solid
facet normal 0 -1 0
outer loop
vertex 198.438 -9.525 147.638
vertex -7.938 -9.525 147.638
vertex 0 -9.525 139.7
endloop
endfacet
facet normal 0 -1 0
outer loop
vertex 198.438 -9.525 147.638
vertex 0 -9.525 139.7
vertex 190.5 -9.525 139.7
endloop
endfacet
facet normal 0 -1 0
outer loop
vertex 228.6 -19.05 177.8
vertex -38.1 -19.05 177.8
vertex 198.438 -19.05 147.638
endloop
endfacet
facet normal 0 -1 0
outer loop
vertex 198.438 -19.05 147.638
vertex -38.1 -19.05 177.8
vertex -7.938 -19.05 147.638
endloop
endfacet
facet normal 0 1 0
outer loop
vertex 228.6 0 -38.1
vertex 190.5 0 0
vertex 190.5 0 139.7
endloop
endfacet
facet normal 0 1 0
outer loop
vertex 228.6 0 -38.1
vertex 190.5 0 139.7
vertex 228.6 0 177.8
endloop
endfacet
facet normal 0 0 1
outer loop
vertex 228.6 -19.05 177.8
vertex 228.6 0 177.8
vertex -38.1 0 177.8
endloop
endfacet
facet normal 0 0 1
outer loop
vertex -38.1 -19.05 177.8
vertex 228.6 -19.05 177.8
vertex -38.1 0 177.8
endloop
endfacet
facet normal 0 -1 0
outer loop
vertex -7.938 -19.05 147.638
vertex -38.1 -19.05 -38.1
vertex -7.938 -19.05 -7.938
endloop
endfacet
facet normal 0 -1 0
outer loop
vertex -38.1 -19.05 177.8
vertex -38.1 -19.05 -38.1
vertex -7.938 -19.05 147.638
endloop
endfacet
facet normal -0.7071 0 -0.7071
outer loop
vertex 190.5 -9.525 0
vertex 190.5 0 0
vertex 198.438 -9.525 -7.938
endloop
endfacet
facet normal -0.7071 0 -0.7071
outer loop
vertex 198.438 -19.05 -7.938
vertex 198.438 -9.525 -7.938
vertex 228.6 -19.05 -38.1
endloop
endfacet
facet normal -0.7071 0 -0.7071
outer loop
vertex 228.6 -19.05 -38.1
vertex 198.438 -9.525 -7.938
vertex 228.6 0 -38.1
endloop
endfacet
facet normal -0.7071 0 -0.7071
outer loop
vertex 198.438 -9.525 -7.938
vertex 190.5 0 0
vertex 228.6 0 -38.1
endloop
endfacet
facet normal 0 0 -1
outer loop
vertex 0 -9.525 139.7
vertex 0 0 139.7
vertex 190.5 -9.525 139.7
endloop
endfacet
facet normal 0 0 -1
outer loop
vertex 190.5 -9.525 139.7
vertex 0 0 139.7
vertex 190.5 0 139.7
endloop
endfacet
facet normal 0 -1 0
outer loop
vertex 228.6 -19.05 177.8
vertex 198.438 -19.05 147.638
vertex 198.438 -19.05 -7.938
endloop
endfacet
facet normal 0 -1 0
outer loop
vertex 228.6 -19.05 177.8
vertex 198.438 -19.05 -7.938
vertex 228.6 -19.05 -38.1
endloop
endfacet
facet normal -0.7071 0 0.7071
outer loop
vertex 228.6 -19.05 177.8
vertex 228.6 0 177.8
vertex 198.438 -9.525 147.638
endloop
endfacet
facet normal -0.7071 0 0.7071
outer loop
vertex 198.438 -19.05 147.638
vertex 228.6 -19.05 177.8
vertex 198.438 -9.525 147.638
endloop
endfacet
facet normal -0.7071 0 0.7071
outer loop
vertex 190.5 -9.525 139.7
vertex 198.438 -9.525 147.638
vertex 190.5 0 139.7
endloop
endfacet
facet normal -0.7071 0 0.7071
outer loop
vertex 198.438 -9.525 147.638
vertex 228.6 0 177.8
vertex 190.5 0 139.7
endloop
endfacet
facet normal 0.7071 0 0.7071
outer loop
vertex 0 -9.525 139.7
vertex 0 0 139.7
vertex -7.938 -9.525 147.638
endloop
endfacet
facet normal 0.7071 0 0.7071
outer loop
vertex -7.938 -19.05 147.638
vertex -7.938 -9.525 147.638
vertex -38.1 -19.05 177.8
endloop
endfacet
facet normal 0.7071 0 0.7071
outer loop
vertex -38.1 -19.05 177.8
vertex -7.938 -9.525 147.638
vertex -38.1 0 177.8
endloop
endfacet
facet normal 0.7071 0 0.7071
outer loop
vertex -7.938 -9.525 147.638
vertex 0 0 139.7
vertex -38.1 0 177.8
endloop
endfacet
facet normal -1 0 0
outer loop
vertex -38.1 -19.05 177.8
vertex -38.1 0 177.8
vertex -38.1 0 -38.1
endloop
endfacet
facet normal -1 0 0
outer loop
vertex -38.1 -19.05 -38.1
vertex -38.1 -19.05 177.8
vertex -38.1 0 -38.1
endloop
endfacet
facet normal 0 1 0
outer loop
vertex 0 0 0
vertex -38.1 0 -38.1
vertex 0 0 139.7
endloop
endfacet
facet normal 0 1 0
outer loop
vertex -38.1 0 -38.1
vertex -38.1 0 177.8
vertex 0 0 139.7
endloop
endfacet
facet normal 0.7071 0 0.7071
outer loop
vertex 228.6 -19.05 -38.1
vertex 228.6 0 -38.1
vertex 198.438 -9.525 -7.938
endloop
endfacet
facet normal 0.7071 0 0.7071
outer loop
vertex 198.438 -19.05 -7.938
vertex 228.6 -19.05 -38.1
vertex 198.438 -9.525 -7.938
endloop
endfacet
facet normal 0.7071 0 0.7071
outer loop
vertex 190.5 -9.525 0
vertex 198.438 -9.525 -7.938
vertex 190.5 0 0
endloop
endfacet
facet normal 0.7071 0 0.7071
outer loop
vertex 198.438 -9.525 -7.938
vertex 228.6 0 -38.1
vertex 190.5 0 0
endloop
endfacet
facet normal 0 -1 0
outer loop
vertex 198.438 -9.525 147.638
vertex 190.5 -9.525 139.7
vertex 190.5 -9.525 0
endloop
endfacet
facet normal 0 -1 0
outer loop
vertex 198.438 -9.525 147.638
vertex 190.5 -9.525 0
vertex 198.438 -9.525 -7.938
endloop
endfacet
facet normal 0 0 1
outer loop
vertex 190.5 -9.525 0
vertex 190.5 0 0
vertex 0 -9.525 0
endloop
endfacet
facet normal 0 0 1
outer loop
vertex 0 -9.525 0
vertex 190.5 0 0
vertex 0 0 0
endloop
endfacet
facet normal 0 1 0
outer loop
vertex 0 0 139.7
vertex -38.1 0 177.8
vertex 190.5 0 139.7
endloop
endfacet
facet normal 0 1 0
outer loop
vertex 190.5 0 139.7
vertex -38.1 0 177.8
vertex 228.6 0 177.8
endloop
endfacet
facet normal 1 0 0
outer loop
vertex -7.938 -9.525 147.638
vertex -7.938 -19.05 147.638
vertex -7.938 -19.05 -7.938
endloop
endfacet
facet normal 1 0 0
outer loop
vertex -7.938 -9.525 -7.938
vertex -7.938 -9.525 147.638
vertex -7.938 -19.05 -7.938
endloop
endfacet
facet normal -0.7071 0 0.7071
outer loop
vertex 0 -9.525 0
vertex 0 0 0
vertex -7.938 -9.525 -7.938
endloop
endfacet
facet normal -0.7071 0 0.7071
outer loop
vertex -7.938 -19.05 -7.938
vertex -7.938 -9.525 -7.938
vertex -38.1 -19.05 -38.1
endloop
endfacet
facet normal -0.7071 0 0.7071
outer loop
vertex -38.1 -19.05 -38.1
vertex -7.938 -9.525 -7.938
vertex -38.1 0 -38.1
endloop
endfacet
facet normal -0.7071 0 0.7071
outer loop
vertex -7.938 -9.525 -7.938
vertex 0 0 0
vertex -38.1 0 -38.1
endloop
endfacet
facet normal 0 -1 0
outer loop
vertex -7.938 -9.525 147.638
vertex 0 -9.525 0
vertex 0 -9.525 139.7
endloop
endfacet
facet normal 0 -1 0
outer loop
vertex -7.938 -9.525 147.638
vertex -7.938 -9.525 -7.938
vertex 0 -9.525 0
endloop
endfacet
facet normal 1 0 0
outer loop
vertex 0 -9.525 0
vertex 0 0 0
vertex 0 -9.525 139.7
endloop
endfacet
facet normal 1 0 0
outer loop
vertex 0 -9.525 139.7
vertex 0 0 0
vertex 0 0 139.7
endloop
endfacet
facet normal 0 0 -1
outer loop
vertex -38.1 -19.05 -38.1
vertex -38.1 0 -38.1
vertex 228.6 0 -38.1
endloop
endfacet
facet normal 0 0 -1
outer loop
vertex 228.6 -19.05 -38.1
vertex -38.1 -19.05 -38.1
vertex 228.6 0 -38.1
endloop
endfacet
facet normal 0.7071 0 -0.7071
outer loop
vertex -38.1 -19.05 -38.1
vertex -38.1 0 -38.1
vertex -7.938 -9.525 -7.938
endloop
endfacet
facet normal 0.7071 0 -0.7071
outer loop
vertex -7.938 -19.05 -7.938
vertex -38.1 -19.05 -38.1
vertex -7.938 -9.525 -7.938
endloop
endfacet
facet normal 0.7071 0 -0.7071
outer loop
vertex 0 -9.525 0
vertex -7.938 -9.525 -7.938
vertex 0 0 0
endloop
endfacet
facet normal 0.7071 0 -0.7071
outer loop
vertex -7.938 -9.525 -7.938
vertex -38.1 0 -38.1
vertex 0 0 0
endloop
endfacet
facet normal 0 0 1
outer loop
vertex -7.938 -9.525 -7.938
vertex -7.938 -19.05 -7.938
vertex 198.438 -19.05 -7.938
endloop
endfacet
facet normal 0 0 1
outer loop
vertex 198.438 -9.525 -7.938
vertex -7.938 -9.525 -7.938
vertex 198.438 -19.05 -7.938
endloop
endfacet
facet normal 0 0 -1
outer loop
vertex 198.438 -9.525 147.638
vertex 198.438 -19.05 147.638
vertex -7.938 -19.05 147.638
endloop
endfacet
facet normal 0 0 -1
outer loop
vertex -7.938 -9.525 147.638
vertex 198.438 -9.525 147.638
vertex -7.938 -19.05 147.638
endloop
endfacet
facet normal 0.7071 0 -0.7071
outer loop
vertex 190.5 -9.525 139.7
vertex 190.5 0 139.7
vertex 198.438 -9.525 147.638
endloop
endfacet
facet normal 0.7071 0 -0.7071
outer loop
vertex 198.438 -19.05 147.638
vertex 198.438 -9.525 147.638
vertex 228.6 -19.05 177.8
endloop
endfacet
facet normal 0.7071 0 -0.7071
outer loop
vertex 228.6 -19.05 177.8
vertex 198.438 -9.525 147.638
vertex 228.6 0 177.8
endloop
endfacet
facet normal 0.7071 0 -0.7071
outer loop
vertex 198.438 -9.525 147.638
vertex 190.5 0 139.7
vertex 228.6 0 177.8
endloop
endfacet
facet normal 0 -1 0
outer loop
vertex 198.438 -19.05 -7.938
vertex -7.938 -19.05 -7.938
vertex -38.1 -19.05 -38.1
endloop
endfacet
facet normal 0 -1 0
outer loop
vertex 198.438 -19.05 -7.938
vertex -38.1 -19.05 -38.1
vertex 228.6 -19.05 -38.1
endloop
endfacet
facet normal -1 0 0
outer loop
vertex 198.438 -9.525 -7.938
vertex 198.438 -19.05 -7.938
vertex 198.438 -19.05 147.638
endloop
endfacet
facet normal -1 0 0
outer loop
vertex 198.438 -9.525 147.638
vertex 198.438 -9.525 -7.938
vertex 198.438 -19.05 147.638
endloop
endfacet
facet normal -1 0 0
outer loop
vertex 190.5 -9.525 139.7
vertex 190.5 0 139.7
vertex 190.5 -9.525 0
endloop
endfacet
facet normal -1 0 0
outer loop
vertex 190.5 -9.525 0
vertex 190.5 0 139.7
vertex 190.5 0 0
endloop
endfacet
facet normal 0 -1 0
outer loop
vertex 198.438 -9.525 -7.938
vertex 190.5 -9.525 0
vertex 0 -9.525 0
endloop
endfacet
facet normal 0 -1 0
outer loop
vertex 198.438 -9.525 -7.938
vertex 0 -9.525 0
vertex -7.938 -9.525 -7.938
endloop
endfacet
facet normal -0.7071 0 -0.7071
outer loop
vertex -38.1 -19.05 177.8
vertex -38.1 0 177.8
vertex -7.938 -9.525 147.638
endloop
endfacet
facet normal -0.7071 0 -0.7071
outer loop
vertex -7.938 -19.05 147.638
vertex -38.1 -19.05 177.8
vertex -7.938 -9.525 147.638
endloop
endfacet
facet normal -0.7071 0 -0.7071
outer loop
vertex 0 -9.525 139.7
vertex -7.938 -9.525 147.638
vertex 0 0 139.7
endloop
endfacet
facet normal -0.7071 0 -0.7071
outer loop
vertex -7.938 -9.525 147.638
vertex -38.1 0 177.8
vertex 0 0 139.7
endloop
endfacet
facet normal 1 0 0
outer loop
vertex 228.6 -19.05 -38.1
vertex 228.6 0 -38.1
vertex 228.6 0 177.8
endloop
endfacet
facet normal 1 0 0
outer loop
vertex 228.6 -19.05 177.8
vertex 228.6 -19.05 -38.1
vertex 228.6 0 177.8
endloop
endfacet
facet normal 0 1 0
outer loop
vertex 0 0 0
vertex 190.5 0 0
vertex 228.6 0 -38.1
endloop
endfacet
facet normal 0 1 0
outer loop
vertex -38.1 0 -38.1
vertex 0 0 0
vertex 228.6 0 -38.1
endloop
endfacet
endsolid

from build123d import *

# Parameters (mm, degrees)
F1_DEPTH = 19.05
F2_DEPTH = 19.05
F3_DEPTH = 19.05
F4_DEPTH = 19.05
F6_DEPTH = 9.525


with BuildPart() as f1:
    # F0 (on Front) → F1 (new body)
    with BuildSketch(Plane.XZ):
        Polygon((-38.1, -38.1), (0, 0), (0, 139.7), (-38.1, 177.8), align=None)
    extrude(amount=F1_DEPTH)


with BuildPart() as f2:
    # F0 (on Front) → F2 (new body)
    with BuildSketch(Plane.XZ):
        Polygon((-38.1, 177.8), (0, 139.7), (190.5, 139.7), (228.6, 177.8), align=None)
    extrude(amount=F2_DEPTH)


with BuildPart() as f3:
    # F0 (on Front) → F3 (new body)
    with BuildSketch(Plane.XZ):
        Polygon((190.5, 139.7), (190.5, 0), (228.6, -38.1), (228.6, 177.8), align=None)
    extrude(amount=F3_DEPTH)


with BuildPart() as f4:
    # F0 (on Front) → F4 (new body)
    with BuildSketch(Plane.XZ):
        Polygon((190.5, 0), (0, 0), (-38.1, -38.1), (228.6, -38.1), align=None)
    extrude(amount=F4_DEPTH)


with BuildPart() as f6_tool:
    # F5 (on face) → F6 (new body)
    with BuildSketch(Plane.XZ.offset(19.05)):
        Polygon((-7.9375, 147.6375), (0, 139.7), (190.5, 139.7), (198.4375, 147.6375), align=None)
        Polygon((0, 0), (0, 139.7), (-7.9375, 147.6375), (-7.9375, -7.9375), align=None)
        Polygon((190.5, 0), (0, 0), (-7.9375, -7.9375), (198.4375, -7.9375), align=None)
        Polygon((198.4375, 147.6375), (190.5, 139.7), (190.5, 0), (198.4375, -7.9375), align=None)
    extrude(amount=-F6_DEPTH)


with BuildPart() as f1_1:
    add(f1.part)

    # F6: cut by f6_tool
    add(f6_tool.part, mode=Mode.SUBTRACT)


with BuildPart() as f2_1:
    add(f2.part)

    # F6: cut by f6_tool
    add(f6_tool.part, mode=Mode.SUBTRACT)


with BuildPart() as f3_1:
    add(f3.part)

    # F6: cut by f6_tool
    add(f6_tool.part, mode=Mode.SUBTRACT)


with BuildPart() as f4_1:
    add(f4.part)

    # F6: cut by f6_tool
    add(f6_tool.part, mode=Mode.SUBTRACT)


solid = Compound([f1_1.part, f2_1.part, f3_1.part, f4_1.part])
